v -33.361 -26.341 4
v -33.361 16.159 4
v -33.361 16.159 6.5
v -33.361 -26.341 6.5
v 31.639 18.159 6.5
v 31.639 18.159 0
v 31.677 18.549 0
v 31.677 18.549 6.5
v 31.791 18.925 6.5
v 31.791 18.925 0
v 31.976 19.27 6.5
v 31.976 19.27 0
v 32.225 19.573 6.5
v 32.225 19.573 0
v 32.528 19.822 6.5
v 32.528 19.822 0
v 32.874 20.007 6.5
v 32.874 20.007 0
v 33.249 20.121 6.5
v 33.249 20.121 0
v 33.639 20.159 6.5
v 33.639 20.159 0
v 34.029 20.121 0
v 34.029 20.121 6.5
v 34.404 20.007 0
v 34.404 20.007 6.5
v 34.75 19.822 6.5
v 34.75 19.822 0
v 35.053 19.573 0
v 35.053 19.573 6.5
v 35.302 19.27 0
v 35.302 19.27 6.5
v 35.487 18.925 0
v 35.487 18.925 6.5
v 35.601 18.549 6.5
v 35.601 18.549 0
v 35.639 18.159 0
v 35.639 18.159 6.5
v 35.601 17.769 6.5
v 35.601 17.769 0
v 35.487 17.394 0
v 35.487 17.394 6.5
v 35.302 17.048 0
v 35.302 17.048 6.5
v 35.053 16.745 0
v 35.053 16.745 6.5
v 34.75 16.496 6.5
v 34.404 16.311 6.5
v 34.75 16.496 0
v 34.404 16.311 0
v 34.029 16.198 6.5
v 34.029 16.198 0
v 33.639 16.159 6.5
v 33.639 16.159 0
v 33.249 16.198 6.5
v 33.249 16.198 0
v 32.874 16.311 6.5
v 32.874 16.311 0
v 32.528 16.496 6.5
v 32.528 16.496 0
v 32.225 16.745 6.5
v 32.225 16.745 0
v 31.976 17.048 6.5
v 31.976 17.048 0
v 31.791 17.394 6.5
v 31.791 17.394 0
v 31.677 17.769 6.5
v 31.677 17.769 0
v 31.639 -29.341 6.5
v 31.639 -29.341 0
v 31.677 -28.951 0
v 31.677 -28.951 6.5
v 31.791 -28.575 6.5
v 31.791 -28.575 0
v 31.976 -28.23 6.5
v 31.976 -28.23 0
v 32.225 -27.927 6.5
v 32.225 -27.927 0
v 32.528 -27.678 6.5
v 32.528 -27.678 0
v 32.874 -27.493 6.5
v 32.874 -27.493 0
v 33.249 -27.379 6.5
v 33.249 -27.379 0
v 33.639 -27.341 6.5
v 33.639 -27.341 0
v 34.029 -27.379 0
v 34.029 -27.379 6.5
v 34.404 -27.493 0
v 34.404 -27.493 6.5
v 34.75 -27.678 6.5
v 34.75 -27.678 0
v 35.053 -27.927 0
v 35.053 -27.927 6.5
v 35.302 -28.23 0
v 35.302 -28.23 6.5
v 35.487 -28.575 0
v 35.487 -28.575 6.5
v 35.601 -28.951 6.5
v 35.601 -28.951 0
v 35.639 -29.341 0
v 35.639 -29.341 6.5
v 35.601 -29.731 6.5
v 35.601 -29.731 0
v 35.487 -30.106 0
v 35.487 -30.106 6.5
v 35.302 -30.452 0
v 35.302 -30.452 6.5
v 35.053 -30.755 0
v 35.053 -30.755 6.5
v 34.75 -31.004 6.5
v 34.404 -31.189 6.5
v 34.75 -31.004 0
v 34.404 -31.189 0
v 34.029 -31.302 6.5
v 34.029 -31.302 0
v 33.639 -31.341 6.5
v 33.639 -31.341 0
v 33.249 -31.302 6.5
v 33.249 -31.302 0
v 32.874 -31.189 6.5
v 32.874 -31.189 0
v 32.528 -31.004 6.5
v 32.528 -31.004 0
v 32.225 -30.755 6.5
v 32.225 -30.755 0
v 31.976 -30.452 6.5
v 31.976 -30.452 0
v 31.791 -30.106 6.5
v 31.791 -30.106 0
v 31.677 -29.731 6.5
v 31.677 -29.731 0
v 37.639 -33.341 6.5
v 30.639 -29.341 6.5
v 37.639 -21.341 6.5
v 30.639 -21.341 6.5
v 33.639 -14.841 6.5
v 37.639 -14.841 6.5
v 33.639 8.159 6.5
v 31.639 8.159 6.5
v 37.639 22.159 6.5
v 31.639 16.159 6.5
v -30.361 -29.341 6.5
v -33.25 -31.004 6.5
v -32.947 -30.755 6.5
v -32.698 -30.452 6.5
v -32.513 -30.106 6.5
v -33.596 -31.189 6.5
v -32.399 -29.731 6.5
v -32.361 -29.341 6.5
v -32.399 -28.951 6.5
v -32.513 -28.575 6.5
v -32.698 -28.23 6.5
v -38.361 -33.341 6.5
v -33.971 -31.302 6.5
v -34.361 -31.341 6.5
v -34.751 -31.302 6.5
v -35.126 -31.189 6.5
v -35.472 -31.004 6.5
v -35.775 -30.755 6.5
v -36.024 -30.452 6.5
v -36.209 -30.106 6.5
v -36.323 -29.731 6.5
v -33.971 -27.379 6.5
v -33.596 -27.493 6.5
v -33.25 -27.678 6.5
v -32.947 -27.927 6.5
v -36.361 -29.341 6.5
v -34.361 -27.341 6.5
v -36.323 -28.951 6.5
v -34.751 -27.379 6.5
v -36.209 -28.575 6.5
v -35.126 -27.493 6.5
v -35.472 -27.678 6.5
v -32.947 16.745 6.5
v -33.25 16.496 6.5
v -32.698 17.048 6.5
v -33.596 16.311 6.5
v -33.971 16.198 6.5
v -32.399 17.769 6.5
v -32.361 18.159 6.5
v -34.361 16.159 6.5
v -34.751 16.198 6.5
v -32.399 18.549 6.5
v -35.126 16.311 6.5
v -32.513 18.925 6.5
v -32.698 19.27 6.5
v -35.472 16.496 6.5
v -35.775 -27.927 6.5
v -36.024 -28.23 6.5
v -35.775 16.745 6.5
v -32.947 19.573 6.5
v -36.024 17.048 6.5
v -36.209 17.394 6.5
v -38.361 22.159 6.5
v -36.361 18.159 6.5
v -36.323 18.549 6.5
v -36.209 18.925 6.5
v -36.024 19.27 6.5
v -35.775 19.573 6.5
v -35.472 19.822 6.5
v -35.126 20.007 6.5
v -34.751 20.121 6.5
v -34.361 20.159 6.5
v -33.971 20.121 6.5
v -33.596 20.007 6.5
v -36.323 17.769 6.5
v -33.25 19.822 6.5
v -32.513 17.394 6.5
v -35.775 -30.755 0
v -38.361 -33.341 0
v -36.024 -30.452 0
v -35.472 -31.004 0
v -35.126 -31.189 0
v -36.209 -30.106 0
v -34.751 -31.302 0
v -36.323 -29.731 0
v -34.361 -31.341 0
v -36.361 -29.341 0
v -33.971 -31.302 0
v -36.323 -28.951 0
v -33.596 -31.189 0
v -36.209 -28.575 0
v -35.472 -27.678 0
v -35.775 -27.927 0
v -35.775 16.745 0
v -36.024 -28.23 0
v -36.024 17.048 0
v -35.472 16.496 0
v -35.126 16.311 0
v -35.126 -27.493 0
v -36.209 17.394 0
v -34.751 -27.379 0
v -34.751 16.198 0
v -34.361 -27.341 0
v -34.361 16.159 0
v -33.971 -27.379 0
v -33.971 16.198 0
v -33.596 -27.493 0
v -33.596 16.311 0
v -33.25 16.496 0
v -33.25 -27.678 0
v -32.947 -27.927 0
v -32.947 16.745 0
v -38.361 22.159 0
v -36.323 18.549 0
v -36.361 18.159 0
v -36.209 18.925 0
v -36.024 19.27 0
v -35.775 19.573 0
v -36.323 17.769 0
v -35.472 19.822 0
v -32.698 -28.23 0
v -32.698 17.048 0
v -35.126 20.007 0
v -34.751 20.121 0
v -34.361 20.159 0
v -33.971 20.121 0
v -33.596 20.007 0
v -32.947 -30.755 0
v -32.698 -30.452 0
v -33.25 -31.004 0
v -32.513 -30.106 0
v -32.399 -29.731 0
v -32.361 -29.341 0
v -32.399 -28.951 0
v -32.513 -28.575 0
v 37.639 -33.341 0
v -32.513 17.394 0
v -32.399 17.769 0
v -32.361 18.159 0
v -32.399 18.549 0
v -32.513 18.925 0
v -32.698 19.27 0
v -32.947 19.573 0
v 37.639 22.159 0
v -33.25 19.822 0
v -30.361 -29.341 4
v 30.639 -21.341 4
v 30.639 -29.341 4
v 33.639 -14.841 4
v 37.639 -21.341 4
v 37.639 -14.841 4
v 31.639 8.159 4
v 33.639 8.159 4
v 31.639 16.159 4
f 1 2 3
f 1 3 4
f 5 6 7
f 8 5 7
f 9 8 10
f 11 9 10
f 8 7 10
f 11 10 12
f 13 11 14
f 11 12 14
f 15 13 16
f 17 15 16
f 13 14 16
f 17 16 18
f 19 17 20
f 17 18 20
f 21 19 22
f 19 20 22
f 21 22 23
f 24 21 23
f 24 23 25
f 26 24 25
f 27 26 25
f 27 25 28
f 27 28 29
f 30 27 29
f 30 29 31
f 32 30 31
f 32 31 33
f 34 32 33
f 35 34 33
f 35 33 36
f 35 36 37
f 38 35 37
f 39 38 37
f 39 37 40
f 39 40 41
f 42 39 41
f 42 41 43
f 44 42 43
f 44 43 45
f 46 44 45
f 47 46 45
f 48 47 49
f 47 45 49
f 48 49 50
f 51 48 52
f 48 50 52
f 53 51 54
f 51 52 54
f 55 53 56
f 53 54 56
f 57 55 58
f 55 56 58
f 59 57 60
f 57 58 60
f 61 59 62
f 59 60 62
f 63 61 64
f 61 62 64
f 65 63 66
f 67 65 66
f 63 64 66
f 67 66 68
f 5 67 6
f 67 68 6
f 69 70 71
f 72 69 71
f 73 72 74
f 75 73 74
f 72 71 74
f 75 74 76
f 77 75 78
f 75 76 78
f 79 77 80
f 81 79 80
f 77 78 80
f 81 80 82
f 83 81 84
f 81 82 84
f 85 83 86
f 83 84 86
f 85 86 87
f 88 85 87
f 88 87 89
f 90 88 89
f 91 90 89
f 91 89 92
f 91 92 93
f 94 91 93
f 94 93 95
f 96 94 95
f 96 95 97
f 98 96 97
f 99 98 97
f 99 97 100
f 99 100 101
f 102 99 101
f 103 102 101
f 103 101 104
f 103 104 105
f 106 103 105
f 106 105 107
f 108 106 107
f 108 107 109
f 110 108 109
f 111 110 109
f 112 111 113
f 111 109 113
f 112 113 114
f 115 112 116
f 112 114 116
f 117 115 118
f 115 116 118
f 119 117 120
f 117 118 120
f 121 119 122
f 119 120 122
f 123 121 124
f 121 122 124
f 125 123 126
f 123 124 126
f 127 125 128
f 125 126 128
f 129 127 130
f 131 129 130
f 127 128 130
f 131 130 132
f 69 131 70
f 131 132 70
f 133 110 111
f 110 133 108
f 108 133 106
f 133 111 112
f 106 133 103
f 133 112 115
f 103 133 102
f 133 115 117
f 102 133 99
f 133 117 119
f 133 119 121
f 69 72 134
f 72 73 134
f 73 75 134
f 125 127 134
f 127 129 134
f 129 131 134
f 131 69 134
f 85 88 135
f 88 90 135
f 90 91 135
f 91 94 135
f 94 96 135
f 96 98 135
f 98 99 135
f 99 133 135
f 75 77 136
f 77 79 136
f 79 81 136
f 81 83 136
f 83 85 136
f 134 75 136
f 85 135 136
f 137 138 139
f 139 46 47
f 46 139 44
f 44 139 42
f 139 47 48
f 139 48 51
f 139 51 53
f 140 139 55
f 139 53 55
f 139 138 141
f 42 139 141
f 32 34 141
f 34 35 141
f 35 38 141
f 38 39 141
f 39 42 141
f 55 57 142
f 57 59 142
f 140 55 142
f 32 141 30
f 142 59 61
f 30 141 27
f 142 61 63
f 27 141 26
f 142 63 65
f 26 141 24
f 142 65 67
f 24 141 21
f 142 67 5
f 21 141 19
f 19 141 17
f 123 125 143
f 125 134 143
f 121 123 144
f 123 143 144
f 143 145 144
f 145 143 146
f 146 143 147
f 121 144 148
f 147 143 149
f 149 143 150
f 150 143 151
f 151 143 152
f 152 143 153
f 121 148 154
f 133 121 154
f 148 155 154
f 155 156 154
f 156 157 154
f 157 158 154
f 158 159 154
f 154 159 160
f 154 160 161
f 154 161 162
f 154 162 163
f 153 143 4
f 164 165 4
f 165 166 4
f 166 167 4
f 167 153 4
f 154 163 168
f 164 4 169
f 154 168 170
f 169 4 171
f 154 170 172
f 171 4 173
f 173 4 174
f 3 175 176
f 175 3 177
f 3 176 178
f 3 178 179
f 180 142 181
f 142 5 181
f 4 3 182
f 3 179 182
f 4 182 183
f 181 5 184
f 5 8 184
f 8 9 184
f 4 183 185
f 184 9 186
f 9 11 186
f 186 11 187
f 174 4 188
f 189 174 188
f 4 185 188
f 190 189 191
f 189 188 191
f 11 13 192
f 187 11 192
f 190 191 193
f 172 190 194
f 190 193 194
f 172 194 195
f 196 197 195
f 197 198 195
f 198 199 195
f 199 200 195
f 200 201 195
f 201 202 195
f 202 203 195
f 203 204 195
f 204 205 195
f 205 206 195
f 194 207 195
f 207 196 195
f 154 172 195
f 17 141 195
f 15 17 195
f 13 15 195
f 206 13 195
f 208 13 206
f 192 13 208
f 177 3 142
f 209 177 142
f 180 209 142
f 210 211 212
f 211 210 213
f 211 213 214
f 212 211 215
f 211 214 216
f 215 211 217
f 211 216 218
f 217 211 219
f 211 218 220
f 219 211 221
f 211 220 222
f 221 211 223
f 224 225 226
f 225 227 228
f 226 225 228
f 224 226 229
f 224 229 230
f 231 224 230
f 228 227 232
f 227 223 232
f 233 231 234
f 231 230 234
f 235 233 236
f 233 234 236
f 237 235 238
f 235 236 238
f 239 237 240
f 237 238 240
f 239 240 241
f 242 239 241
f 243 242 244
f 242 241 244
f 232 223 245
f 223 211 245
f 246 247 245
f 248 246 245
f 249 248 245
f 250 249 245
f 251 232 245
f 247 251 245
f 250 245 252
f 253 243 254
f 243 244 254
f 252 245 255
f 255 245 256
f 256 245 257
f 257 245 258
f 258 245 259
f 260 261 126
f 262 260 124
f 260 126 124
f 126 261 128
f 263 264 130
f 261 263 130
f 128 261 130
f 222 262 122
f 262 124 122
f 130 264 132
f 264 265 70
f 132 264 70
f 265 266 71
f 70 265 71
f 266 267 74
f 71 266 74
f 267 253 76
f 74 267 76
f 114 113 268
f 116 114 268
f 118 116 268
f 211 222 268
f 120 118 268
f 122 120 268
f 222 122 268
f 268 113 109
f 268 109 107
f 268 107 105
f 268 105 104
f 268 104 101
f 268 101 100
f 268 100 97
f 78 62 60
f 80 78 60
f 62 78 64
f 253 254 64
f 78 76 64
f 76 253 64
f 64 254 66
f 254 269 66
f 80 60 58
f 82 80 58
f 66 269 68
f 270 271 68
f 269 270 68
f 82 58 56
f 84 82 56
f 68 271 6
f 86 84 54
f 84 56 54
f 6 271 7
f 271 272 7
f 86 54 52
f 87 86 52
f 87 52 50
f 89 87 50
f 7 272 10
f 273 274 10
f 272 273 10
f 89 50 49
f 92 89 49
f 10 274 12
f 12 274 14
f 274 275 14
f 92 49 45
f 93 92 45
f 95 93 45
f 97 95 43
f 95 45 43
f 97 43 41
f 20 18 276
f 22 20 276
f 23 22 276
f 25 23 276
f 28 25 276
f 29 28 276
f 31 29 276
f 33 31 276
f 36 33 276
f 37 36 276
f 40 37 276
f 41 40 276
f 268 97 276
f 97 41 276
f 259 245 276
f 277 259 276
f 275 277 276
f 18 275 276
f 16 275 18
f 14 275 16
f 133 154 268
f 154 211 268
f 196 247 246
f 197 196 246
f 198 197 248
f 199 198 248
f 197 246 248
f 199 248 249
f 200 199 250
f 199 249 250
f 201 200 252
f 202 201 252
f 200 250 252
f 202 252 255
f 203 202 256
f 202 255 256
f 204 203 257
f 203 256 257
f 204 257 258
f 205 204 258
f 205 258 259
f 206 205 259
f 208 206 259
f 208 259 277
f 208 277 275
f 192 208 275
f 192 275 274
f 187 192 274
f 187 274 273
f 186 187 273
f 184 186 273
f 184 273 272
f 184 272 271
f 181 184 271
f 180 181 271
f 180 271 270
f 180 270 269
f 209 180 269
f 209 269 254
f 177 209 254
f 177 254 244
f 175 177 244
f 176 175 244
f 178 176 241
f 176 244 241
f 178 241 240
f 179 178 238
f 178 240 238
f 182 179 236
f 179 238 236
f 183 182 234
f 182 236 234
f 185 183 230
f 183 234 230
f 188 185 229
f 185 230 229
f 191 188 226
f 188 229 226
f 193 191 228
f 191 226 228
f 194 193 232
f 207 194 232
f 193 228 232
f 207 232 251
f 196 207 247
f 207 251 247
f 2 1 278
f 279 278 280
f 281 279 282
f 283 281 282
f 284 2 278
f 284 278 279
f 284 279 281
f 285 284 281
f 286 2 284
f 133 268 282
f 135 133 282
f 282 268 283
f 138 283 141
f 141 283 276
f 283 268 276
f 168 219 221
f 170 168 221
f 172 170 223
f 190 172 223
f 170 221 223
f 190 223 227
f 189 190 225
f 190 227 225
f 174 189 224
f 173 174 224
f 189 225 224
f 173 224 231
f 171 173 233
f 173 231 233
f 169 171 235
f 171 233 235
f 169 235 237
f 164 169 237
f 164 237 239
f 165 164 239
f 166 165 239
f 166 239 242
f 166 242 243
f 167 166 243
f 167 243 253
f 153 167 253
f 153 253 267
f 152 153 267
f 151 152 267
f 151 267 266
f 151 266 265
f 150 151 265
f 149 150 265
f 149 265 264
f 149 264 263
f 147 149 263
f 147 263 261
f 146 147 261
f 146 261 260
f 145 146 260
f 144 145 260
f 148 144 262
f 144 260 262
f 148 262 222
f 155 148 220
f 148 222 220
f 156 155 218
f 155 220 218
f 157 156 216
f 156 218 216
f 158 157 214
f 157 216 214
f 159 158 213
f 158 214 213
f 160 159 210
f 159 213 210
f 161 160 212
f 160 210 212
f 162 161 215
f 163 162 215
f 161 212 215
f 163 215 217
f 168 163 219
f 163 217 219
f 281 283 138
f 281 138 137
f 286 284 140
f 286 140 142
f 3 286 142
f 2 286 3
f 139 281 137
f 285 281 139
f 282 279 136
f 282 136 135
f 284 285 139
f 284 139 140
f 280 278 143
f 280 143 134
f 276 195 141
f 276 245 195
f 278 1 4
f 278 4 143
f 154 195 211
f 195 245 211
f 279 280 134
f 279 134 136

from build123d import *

# Parameters (mm, degrees)
SKETCH1_W                 = 76
SKETCH1_H                 = 55.5
BOSS_EXTRUDE1_DEPTH       = 4
BOSS_EXTRUDE2_DEPTH       = 2.5
F_4_0MM_DOWEL_HOLE1_D     = 4
F_4_0MM_DOWEL_HOLE1_DEPTH = 6.5


with BuildPart() as part:
    # Sketch1 → Boss-Extrude1 (new body)
    with BuildSketch(Plane.XY):
        with Locations((-0.361045131, -5.590855107)):
            Rectangle(SKETCH1_W, SKETCH1_H)
    extrude(amount=BOSS_EXTRUDE1_DEPTH)

    # Sketch2 → Boss-Extrude2 (add)
    with BuildSketch(Plane.XY.offset(4)):
        Polygon((-38.361045131, 22.159144893), (37.638954869, 22.159144893), (37.638954869, 16.159144893), (37.638954869, 8.159144893), (37.638954869, -14.840855107), (33.638954869, -14.840855107), (33.638954869, 8.159144893), (31.638954869, 8.159144893), (31.638954869, 16.159144893), (-33.361045131, 16.159144893), (-33.361045131, -26.340855107), (-30.361045131, -29.340855107), (30.638954869, -29.340855107), (30.638954869, -21.340855107), (37.638954869, -21.340855107), (37.638954869, -29.340855107), (37.638954869, -33.340855107), (-33.361045131, -33.340855107), (-38.361045131, -33.340855107), (-38.361045131, 16.159144893), align=None)
    extrude(amount=BOSS_EXTRUDE2_DEPTH)

    # Ø4.0mm Dowel Hole1
    with Locations(Plane.XY.offset(6.5)):
        with Locations((-34.361045131, 18.159144893), (33.638954869, 18.159144893), (33.638954869, -29.340855107), (-34.361045131, -29.340855107)):
            Hole(F_4_0MM_DOWEL_HOLE1_D / 2, depth=F_4_0MM_DOWEL_HOLE1_DEPTH)


solid = part.part
